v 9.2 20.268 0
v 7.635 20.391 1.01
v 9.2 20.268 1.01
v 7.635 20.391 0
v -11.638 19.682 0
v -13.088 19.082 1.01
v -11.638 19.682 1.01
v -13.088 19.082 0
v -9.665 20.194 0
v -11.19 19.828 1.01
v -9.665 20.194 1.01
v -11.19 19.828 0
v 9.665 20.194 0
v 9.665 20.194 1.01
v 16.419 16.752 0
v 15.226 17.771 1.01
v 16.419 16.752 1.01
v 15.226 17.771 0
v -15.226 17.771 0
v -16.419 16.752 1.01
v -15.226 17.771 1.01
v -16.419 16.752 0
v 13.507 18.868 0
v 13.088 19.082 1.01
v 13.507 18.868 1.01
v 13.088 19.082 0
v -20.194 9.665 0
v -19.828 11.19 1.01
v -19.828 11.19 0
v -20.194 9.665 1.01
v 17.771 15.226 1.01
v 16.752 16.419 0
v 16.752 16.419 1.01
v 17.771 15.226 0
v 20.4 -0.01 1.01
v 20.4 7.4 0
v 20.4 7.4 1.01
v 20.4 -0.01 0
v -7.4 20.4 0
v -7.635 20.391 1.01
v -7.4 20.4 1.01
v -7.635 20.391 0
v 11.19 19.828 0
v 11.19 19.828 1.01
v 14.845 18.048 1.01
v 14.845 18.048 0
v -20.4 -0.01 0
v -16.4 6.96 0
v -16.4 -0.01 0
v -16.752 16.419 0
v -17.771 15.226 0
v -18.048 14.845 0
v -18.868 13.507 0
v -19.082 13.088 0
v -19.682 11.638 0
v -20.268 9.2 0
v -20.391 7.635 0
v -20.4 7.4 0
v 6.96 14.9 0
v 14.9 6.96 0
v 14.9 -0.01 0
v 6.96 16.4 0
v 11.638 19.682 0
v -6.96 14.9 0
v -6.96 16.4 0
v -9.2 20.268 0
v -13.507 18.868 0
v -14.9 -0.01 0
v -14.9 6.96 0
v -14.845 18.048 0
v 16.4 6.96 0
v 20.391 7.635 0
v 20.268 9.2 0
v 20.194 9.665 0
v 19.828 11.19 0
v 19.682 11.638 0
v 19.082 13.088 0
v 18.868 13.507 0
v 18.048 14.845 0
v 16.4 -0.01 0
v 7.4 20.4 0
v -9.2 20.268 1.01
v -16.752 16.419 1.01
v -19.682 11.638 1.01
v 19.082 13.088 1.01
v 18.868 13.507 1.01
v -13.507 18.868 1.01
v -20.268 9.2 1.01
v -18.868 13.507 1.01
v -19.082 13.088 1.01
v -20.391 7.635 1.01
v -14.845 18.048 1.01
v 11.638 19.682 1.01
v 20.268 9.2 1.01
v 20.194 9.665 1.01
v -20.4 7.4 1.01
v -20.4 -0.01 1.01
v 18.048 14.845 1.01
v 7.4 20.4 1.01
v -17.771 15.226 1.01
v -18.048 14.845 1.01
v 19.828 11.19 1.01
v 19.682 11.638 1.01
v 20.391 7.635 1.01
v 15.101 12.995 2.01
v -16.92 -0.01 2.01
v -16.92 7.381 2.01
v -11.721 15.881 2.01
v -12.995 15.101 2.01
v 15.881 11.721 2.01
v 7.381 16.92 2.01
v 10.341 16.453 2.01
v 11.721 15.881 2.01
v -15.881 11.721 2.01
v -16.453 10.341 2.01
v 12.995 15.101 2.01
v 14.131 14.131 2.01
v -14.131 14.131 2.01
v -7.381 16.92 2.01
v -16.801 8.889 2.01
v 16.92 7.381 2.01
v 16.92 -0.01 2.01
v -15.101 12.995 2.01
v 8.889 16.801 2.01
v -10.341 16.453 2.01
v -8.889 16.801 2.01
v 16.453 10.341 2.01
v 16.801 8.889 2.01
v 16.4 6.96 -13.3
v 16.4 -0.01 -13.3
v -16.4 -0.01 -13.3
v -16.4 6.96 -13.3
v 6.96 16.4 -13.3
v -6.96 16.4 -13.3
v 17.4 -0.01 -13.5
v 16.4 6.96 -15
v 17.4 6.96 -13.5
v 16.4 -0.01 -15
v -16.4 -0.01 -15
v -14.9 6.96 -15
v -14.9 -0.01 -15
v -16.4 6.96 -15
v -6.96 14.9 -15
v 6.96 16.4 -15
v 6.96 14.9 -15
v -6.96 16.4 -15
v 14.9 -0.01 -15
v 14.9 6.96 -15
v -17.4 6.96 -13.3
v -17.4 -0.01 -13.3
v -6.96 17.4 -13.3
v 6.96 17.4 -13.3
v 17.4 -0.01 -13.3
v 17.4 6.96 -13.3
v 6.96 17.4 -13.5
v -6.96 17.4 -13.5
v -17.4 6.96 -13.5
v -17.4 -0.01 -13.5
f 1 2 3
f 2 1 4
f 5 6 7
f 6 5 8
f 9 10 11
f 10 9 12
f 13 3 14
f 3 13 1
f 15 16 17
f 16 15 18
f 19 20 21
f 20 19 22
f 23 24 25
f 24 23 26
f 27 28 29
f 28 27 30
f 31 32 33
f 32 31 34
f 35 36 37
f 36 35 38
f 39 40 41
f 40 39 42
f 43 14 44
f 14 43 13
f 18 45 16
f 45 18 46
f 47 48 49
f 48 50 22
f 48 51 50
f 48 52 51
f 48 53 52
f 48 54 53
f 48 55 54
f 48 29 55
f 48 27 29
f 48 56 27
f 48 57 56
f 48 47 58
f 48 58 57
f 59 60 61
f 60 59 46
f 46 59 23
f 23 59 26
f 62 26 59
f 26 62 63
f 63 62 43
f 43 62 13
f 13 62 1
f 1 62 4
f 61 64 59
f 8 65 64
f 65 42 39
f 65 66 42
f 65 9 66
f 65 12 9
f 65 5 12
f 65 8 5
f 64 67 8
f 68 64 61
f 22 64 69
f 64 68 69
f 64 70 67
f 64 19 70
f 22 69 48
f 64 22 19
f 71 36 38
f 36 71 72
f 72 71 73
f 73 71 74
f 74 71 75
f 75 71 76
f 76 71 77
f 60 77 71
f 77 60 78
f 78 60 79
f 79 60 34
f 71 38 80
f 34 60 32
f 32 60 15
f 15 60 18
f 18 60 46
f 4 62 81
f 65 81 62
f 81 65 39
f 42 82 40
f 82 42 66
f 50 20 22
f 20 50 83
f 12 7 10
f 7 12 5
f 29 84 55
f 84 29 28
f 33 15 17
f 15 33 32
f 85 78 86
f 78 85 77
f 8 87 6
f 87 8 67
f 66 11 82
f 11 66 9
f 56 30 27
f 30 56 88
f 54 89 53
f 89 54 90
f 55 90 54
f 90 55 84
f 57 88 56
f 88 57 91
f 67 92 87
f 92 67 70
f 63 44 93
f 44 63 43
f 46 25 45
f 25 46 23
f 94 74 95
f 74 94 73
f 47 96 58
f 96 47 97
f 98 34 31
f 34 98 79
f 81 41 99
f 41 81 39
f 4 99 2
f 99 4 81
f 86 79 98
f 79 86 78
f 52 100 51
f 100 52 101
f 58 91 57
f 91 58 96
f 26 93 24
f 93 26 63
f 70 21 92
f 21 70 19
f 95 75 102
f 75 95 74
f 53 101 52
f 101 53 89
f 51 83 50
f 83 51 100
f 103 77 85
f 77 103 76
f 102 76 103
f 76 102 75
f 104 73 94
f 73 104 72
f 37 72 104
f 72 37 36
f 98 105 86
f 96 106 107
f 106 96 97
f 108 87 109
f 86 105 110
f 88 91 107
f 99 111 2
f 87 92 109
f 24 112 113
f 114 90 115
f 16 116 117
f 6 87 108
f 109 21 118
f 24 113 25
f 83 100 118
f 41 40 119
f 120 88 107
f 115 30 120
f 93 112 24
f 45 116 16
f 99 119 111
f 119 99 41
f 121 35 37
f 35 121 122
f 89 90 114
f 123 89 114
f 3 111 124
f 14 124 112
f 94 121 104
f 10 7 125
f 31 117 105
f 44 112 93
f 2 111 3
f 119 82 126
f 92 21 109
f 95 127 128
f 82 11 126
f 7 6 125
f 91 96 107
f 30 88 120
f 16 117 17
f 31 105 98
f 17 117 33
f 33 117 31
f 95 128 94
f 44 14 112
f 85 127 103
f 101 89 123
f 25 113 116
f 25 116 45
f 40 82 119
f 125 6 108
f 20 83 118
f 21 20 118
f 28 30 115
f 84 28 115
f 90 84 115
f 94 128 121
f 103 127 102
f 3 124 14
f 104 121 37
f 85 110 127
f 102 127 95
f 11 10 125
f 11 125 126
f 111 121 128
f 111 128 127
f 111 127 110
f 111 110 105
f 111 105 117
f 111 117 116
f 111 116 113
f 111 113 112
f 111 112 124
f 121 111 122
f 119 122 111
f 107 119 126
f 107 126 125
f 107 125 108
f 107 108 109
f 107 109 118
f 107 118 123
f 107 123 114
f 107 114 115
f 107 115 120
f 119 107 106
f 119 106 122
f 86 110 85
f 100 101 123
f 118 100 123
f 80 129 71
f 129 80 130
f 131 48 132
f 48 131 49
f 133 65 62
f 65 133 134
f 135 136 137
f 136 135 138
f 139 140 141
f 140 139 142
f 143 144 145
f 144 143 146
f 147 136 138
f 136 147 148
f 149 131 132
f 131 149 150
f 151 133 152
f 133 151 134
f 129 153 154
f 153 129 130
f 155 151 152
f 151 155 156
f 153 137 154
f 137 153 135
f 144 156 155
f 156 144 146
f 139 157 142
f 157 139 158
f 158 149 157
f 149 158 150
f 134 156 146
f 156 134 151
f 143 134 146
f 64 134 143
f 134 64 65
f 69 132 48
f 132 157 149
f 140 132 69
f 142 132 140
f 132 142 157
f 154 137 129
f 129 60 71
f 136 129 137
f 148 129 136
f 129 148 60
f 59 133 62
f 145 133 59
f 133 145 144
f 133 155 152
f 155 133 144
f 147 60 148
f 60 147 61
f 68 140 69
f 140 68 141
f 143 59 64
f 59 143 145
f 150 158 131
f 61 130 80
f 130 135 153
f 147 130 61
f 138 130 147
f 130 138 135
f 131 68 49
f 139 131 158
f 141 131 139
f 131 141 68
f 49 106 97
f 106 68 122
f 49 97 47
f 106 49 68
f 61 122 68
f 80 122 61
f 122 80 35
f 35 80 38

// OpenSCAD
/*----------------------------------------------------------------------------*/
/* Cap Generator
/* by Ziv Botzer
/*----------------------------------------------------------------------------*/

// Turn on for validation during preview, TURN OFF FOR PRODUCTION
show_slice = "On"; // [On, Off]

// Hole shape
hole_shape = "Square"; // [Round, Square, Rectangle]

// HOLE Dimension 1 (if circular = diameter)
hole_dimension1 = 34.8; // [10:0.1:150]

// HOLE Dimension 2 (only for rectangle shape)
hole_dimension2 = 50; // [10:0.1:150]

// HOLE Corner Radius (for square/rectangle shapes)
hole_radius = 10; // [0:0.1:20]

// HOLE Depth (e.g. for a table, thickness of the board)
hole_depth = 20; // [2:0.1:100]


// PLUG: plug length
plug_length = 15; // [2:0.1:100]

// PLUG: plug clearance inside hole
plug_clearance = 1; // [0:0.1:5]

// PLUG: plug material thickness
plug_thickness = 1.5; // [0.5:0.1:5]

// PLUG: Choose if you like snaps or fins
features = "Snaps"; // [Snaps, Fins, None]

// PLUG: Snaps/Fins protrusion of teeth (mm)
feature_length = 1.0; // [0.1:0.1:6]

// PLUG: Snaps/Fins height of teeth (mm)
feature_height = 1.5; // [0.1:0.1:6]

// PLUG FINS: Number of fins
fin_number = 3; // [1:1:6]

// PLUG SNAPS: Determines gaps size between snaps
snap_width_factor = 0.5; // [0.1:0.1:1]


// COVER: thickness (mm)
cover_thickness = 2; // [0.5:0.1:15]

// COVER: Overlap around hole
cover_offset = 3; // [0:0.1:30]

// COVER: Edge design
cover_edge = "Chamfer"; // [Chamfer, Round]

// COVER: Edge design ratio 1 (relative size of chamfer/fillet)
cover_edge_ratioV = 0.5; // [0:0.1:1]

// COVER: Edge design ratio 2 (relative size of chamfer/fillet)
cover_edge_ratioH = 0.1; // [0:0.1:1]

// QUALITY: number of polygon facets
$fn = 40;

// QUALITY: steps in fillet cover design 
fillet_steps = 6; // [4:1:15]


/* [Hidden] */
clearance = 0.01;
show_slice_ = (show_slice=="On");
snaps = features == "Snaps";
fins = features == "Fins";

/* testing area
hole_shape = "Rectangle"; // [Round, Square, Rectangle]
snap_width_factor = .5; // [0.1:0.1:1]
show_slice = "Off"; // [On, Off]
features = "Fins"; // [Snaps, Fins, None]
fin_number = 3; // [1:1:6]
hole_radius = 1; // [0:0.1:20]
*/

/*****************************************/
// Show hole

larger_dim = ((hole_shape=="Rectangle")?max(hole_dimension1, hole_dimension2) : hole_dimension1) + cover_offset;
smaller_dim = (hole_shape=="Rectangle")?min(hole_dimension1, hole_dimension2) : hole_dimension1;
largest_depth = max(hole_depth, plug_length)+cover_thickness+1;

// can't have corner radius exceed half the facet length
hole_radius_safe = (hole_radius > smaller_dim/2) ? (smaller_dim/2 - clearance) : hole_radius;

// Illustrate the piece needing a cover
if (show_slice_)
%difference() {
    translate([0,0,-hole_depth/2])
    cube([larger_dim*1.5,larger_dim*1.5,hole_depth],center=true);
    
    translate([0,0,-(hole_depth+clearance)])
    linear_extrude(hole_depth+4*clearance)
    gen_hole_shape(hole_dimension1, hole_dimension2, hole_radius_safe);

    if (show_slice_)
        translate([0,-larger_dim/2, -(largest_depth/2-clearance)])
        cube([larger_dim*2.2, larger_dim*1, largest_depth+clearance*4], center=true);
}

// Generate the cap
difference() {
    generate_cap();
    
    color("Red")
    if (show_slice_)
        translate([0,-larger_dim/2-0.01, -(largest_depth/2)])
        cube([larger_dim*1.8, larger_dim*1, largest_depth*2], center=true);
}




//********************** FUNCTIONS *****************************

module generate_cap () {
    
    union() {
        // Generate cover with corner design
        if (cover_edge == "Chamfer") {
            linear_extrude((1-cover_edge_ratioV)*cover_thickness + clearance, convexity = 4)
            offset(r=cover_offset)
                gen_hole_shape(hole_dimension1, hole_dimension2, hole_radius_safe);
            
            hull() {
                translate([0,0,(1-cover_edge_ratioV)*cover_thickness])
                for (i = [0,1]) {
                    translate([0,0,i*cover_edge_ratioV*cover_thickness])
                    linear_extrude(0.01)
                    offset(r=cover_offset-i*cover_edge_ratioH*smaller_dim)
                    gen_hole_shape(hole_dimension1, hole_dimension2, hole_radius_safe);
                }
            }
            
         
        }
        else if (cover_edge == "Round") {
            linear_extrude((1-cover_edge_ratioV)*cover_thickness + clearance, convexity = 4)
            offset(r=cover_offset)
                gen_hole_shape(hole_dimension1, hole_dimension2, hole_radius_safe);
            
            hull() {
                translate([0,0,(1-cover_edge_ratioV)*cover_thickness])
                for (i = [0:1/fillet_steps:1]) {
                    translate([0,0, sin(i*90)*cover_edge_ratioV*cover_thickness])
                    linear_extrude(0.01)
                    offset(r=cover_offset - (1-cos(i*90))*cover_edge_ratioH*smaller_dim)
                    gen_hole_shape(hole_dimension1, hole_dimension2, hole_radius_safe);
                }
            }
        }
        
        // Generate plug
        difference() {
            
            union() {
                translate([0,0,-(plug_length) + clearance])
                linear_extrude(plug_length+clearance, convexity = 4)
                offset(r=-plug_clearance)
                gen_hole_shape(hole_dimension1, hole_dimension2, hole_radius_safe);

                
                // Generate plug fins
                //translate([0,0,-(hole_depth) + clearance])
                if (fins) {
                    d = plug_length/(fin_number+1);
                    for (i = [1:fin_number]) {
                        translate([0,0,-(d*i + 0.3*d)])
                        hull() {
                            linear_extrude(0.01)
                            offset(r=-plug_clearance)
                            gen_hole_shape(hole_dimension1, hole_dimension2, hole_radius_safe);
                            
                            translate([0,0,feature_height])
                            linear_extrude(0.2)
                            offset(r=feature_length-plug_clearance)
                            gen_hole_shape(hole_dimension1, hole_dimension2, hole_radius_safe);
                        }
                    }
                }
                
                if (snaps) {
                    translate([0,0,-plug_length])
                    hull() {
                        linear_extrude(0.01)
                        offset(r=-plug_clearance)
                        gen_hole_shape(hole_dimension1, hole_dimension2, hole_radius_safe);
                        
                        translate([0,0,feature_height])
                        linear_extrude(0.2)
                        offset(r=feature_length-plug_clearance)
                        gen_hole_shape(hole_dimension1, hole_dimension2, hole_radius_safe);
                    }

                }
            }
            
            // remove inner volume of plug
            translate([0,0,-(plug_length) - clearance])
            linear_extrude(plug_length+2*clearance, convexity = 4)
            offset(r=-(plug_clearance+plug_thickness))
            gen_hole_shape(hole_dimension1, hole_dimension2, hole_radius_safe);
            
            // remove edge chamfer
            if (!snaps)
            translate([0,0,-(plug_length) ])
            difference() {
                linear_extrude(plug_thickness/2 + clearance )
                offset(r=-plug_clearance  + clearance)
                gen_hole_shape(hole_dimension1, hole_dimension2, hole_radius_safe);
            
                hull() {
                    linear_extrude(0.01)
                    offset(r=-plug_clearance -(plug_thickness/2)  + 2*clearance)
                    gen_hole_shape(hole_dimension1, hole_dimension2, hole_radius_safe);
                    
                    translate([0,0,plug_thickness/2 + 2*clearance ])
                    linear_extrude(0.01)
                    offset(r=-plug_clearance)
                    gen_hole_shape(hole_dimension1, hole_dimension2, hole_radius_safe);
                }
            }
            
            // remove snap gaps
            if (snaps) {
                if (hole_shape == "Square") {
                    factor = 0.5+snap_width_factor*0.4;
                    rotate([0,0,45])
                    for (i = [1:4]) {
                        rotate([0,0,i*360/4])
                        translate([factor*hole_dimension1/sin(45),0,-(plug_length/2 + clearance)])
                        rotate([0,0,45])
                        cube([hole_dimension1,hole_dimension1,plug_length+4*clearance], center=true);
                    }
                    
                } 
                else if (hole_shape == "Round") {
                    factor = 0.48+snap_width_factor*0.3;
                    rotate([0,0,45])
                    for (i = [1:4]) {
                        rotate([0,0,i*360/4])
                        translate([factor*hole_dimension1/sin(45),0,-(plug_length/2 + clearance)])
                        rotate([0,0,45])
                        cube([hole_dimension1,hole_dimension1,plug_length+4*clearance], center=true);
                    }
                }
                else { // Rectangle
                    factor = 0.5+0.4*snap_width_factor;
                    
                    translate([-factor*hole_dimension1,factor*hole_dimension2,-(plug_length/2 + clearance)])
                    cube([hole_dimension1,hole_dimension2,plug_length+4*clearance], center=true);
                    
                    translate([factor*hole_dimension1,factor*hole_dimension2,-(plug_length/2 + clearance)])
                    cube([hole_dimension1,hole_dimension2,plug_length+4*clearance], center=true);
                    
                    translate([-factor*hole_dimension1,-factor*hole_dimension2,-(plug_length/2 + clearance)])
                    cube([hole_dimension1,hole_dimension2,plug_length+4*clearance], center=true);
                    
                    translate([factor*hole_dimension1,-factor*hole_dimension2,-(plug_length/2 + clearance)])
                    cube([hole_dimension1,hole_dimension2,plug_length+4*clearance], center=true);
                    
                }
                
            }
            
        }
    }
}

module gen_hole_shape ( d1, d2, r1 ) {
    if (hole_shape == "Round") {
        circle(d=d1);
    }
    else {
        d1b = d1 - 2*r1;
        d2b = ((hole_shape == "Square")?d1:d2) - 2*r1;
        
        translate([-d1b/2,-d2b/2,0]) {
            if (r1 > 0)
                minkowski() {
                    circle(r1);
                    square([d1b,d2b]);
                }
            else {
                square([d1b,d2b]);
            }
        }
    }
}
